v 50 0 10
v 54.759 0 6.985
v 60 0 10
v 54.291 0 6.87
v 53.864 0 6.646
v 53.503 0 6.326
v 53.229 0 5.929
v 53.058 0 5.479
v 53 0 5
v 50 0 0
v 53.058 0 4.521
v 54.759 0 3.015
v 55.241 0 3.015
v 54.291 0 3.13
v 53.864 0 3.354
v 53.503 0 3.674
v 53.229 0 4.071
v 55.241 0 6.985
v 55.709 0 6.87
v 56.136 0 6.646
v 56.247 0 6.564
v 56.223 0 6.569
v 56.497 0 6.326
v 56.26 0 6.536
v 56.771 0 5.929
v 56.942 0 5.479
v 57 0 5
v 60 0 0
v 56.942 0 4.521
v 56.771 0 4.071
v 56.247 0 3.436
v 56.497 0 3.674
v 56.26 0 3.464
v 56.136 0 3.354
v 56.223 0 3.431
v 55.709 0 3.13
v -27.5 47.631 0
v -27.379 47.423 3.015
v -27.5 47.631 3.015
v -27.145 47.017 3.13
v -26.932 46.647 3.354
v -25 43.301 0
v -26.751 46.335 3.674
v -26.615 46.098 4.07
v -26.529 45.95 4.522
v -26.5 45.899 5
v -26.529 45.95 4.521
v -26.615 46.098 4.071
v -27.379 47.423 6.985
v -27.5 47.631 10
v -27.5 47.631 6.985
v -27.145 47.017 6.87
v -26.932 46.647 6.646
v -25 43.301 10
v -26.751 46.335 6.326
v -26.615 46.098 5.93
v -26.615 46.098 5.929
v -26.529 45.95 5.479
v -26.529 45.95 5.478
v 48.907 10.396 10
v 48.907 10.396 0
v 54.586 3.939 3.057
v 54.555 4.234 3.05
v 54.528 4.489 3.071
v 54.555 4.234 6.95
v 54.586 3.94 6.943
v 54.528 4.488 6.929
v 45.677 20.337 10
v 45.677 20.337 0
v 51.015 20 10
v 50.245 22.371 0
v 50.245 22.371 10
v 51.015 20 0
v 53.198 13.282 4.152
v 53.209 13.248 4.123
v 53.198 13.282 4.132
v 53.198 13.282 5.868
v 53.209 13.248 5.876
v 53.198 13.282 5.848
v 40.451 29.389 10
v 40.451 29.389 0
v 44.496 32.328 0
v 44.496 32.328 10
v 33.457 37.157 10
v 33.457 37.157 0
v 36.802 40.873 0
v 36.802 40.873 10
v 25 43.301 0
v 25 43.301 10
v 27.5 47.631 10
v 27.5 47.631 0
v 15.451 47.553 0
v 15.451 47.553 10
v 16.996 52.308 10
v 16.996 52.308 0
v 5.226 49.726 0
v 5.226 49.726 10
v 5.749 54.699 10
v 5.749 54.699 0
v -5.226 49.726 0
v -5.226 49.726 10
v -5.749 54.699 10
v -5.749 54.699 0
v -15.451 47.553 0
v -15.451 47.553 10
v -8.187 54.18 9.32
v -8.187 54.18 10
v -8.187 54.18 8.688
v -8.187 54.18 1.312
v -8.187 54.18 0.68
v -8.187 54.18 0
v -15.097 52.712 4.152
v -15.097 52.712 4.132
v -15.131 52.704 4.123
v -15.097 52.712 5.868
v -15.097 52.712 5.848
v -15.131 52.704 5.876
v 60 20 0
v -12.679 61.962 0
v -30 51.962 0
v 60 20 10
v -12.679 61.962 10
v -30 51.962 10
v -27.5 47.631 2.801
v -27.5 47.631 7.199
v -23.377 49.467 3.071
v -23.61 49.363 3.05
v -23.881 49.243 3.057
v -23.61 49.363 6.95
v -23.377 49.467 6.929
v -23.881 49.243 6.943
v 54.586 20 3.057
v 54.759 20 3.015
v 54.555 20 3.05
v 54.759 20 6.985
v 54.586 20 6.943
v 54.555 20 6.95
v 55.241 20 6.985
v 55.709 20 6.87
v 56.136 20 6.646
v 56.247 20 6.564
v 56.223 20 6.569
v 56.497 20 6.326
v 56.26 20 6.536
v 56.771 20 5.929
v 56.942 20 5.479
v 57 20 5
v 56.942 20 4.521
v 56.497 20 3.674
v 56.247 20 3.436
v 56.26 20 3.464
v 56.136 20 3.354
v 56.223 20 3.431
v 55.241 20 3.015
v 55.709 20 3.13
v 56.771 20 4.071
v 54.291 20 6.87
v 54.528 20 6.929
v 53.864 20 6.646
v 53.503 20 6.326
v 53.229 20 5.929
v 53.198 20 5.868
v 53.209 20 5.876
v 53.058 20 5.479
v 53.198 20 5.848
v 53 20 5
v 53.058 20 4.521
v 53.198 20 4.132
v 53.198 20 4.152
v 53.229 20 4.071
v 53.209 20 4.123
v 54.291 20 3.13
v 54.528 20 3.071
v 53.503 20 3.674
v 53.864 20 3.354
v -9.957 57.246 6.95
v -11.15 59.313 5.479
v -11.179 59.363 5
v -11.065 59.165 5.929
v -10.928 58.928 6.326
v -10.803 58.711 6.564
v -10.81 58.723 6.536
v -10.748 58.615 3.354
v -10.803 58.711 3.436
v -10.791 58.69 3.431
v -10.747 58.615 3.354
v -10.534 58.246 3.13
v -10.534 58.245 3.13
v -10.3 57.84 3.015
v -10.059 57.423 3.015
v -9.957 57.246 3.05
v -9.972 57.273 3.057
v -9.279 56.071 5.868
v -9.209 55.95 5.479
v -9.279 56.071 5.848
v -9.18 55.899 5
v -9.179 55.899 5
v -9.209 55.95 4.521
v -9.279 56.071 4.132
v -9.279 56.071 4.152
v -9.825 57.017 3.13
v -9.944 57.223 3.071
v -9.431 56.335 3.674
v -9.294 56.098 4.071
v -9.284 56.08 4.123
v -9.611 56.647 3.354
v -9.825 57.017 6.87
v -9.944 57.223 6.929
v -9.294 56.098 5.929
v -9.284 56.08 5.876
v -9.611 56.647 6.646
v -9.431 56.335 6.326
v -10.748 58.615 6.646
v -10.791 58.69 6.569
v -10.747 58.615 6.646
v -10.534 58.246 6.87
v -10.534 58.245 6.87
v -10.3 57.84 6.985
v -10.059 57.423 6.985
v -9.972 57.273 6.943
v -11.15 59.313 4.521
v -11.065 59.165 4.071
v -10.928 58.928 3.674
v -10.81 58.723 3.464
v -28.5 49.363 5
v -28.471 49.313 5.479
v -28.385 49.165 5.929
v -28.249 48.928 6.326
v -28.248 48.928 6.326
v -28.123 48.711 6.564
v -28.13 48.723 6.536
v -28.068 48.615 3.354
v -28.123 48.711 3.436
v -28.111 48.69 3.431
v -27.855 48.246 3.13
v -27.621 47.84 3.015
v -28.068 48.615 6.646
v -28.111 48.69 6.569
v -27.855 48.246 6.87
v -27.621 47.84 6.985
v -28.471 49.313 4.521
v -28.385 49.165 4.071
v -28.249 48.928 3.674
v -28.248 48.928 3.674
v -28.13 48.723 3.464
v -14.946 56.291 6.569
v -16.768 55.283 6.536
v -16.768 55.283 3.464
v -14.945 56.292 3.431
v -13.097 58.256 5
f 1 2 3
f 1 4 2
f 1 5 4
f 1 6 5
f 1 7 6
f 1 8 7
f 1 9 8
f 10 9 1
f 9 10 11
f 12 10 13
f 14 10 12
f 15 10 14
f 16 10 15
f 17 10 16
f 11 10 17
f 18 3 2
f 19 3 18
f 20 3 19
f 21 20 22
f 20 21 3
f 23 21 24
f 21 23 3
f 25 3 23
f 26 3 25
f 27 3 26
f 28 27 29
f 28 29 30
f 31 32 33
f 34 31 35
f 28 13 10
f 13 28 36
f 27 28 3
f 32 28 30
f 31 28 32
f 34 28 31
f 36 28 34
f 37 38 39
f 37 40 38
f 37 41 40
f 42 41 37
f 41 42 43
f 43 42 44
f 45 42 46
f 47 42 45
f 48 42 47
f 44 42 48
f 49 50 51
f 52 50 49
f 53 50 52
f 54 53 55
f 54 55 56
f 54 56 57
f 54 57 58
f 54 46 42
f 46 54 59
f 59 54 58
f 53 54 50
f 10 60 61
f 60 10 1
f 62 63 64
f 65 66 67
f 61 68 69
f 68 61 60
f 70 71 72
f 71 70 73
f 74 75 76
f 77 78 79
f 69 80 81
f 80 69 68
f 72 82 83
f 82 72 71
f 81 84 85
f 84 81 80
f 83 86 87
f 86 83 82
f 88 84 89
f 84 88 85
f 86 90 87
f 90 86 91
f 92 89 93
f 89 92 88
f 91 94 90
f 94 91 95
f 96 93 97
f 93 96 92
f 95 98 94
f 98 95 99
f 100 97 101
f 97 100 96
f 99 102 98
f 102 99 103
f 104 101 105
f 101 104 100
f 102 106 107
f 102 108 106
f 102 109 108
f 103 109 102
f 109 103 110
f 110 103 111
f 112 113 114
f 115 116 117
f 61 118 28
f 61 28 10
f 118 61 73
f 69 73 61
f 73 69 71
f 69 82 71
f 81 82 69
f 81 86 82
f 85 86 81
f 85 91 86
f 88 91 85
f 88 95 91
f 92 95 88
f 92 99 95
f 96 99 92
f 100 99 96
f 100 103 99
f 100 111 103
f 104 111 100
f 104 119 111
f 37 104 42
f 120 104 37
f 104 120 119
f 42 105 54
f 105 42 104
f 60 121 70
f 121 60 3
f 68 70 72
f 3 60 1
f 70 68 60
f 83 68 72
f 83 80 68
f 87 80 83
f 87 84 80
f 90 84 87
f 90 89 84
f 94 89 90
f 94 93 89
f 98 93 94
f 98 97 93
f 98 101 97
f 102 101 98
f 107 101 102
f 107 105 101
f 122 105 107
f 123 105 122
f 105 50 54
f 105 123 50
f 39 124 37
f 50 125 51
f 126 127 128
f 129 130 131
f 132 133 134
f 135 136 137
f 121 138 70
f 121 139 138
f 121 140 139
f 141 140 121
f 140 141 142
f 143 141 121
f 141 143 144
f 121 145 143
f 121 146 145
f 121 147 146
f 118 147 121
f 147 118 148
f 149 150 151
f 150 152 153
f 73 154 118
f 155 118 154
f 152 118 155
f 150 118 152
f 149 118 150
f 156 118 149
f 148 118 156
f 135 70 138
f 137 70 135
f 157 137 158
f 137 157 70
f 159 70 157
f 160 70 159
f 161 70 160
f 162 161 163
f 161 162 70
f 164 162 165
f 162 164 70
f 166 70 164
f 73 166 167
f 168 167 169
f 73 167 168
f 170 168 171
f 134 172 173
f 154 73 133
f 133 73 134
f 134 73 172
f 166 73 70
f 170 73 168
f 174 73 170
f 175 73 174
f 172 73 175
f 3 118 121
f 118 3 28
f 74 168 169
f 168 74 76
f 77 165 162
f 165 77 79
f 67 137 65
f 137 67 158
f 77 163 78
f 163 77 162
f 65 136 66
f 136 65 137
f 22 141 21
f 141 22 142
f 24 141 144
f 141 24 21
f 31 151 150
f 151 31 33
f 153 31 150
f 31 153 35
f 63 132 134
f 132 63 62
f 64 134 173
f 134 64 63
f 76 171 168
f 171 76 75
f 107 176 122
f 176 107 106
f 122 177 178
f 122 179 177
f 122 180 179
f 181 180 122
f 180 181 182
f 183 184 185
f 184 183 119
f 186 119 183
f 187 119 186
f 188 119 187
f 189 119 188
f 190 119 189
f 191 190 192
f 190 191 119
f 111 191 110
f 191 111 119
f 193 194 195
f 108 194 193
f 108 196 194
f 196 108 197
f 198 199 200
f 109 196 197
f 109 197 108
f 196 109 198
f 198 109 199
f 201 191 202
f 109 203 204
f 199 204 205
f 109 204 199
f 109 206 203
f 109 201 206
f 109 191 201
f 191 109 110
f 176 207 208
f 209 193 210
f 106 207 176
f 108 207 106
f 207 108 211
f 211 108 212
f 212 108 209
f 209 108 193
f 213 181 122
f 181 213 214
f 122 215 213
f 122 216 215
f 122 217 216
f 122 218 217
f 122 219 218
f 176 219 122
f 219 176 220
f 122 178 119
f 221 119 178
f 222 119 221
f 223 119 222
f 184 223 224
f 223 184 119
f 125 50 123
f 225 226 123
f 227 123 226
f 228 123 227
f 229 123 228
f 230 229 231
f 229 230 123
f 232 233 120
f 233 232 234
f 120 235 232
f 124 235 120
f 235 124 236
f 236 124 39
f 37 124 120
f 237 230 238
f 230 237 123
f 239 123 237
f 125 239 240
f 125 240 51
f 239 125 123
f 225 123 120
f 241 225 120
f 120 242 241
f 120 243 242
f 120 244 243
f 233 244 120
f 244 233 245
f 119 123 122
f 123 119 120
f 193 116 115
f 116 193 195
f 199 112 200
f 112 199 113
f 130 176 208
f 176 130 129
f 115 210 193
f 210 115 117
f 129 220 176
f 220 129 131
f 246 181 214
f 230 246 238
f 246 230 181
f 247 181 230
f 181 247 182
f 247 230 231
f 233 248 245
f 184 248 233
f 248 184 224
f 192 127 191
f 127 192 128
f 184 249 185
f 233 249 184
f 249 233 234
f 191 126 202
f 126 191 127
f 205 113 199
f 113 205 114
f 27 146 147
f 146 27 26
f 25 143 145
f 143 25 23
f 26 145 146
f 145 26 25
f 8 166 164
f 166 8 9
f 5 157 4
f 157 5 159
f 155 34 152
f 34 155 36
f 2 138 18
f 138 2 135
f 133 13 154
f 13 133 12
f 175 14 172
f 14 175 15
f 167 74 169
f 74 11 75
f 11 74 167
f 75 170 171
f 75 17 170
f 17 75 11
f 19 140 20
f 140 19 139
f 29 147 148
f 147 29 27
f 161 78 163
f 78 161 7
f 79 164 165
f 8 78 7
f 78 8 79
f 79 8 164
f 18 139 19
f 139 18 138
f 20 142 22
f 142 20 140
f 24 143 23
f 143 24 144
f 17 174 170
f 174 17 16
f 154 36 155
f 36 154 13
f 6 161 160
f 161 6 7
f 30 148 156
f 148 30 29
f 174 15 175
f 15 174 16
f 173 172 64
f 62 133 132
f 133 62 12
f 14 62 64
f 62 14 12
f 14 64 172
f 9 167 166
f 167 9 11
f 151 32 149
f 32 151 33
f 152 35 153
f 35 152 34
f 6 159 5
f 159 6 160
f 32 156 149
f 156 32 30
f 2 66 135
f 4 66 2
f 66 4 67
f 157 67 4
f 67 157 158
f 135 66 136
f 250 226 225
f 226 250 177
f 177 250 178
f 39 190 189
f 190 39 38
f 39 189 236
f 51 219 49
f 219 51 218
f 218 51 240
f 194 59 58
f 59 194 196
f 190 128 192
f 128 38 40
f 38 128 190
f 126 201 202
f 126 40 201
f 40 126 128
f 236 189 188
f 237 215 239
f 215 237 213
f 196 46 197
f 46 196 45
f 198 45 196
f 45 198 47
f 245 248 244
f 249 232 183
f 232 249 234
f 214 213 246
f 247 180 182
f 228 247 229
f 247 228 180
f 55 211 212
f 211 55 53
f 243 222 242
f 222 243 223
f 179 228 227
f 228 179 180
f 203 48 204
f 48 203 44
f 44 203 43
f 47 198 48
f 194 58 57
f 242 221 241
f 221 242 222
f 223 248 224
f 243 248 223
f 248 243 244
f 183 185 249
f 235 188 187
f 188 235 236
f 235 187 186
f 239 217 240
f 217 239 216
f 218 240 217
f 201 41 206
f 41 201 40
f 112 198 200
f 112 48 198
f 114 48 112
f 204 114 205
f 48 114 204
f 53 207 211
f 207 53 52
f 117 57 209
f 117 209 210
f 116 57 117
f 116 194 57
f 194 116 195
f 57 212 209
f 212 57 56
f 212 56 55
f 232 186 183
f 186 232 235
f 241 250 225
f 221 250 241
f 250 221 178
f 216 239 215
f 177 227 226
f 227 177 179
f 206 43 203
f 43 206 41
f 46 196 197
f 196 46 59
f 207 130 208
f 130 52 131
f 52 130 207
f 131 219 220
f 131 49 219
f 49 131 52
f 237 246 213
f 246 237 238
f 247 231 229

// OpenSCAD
// Global resolution
if ($preview) {
  // Don't generate smaller facets than this many mm.
  $fs = 1;
  // Don't generate larger angles than this many degrees.
  $fa = 1;
}

strap(120, 50, 5, 10, 4, 10, 20);
module strap(angle=120, radius=50, thickness=5, width=10, boss_hole_diam=4, boss_thickness=10, boss_length=20,
             render_boss_1=true, render_boss_2=true) {
  difference() {
    strap_body(angle, radius, thickness, width, boss_hole_diam, boss_thickness, boss_length, render_boss_1, render_boss_2);
    if (render_boss_1) {
      translate([radius, 0, 0])
        strap_boss_hole(boss_thickness, width, boss_hole_diam, boss_length);
    }
    if (render_boss_2) {
      rotate([0, 0, angle])
        mirror([0, 1, 0])
          translate([radius, 0, 0])
            strap_boss_hole(boss_thickness, width, boss_hole_diam, boss_length);
    }
  }
}

module strap_body(angle, radius, thickness, width, boss_hole_diam, boss_thickness, boss_length, render_boss_1, render_boss_2) {
  rotate_extrude(angle=angle) 
    strap_profile(radius, thickness, width);
  if (render_boss_1) {
    translate([radius, 0, 0])
      strap_boss(boss_thickness, width, boss_hole_diam, boss_length);
  }
  if (render_boss_2) {
    rotate([0, 0, angle])
      mirror([0, 1, 0])
        translate([radius, 0, 0])
          strap_boss(boss_thickness, width, boss_hole_diam, boss_length);
  }
}

module strap_profile(radius, thickness, width) {
  translate([radius, 0, 0])
    polygon(points=[
      [0,0],
      [thickness, 0],
      [thickness, width],
      [0, width]
      ]);
}

module strap_boss(thickness, width, hole_diam, length) {
  translate([0, length, 0])
    rotate([90, 0, 0])
      // convexity param fixes rendering artifact when applying difference
      // to the strap_boss_hole.
      linear_extrude(height=length, convexity=2)
        strap_boss_profile(thickness, width, hole_diam);
}

module strap_boss_profile(thickness, width, hole_diam) {
  difference() {
    square(size=[thickness, width], center=false);
    translate([thickness/2, width/2, 0]) circle(d=hole_diam);
  }
}

module strap_boss_hole(thickness, width, hole_diam, length) {
  translate([thickness/2, length+0.01, width/2, ])
    rotate([90, 0, 0])
      cylinder(h=length+0.02, d=hole_diam, $fs=0.5);
}
